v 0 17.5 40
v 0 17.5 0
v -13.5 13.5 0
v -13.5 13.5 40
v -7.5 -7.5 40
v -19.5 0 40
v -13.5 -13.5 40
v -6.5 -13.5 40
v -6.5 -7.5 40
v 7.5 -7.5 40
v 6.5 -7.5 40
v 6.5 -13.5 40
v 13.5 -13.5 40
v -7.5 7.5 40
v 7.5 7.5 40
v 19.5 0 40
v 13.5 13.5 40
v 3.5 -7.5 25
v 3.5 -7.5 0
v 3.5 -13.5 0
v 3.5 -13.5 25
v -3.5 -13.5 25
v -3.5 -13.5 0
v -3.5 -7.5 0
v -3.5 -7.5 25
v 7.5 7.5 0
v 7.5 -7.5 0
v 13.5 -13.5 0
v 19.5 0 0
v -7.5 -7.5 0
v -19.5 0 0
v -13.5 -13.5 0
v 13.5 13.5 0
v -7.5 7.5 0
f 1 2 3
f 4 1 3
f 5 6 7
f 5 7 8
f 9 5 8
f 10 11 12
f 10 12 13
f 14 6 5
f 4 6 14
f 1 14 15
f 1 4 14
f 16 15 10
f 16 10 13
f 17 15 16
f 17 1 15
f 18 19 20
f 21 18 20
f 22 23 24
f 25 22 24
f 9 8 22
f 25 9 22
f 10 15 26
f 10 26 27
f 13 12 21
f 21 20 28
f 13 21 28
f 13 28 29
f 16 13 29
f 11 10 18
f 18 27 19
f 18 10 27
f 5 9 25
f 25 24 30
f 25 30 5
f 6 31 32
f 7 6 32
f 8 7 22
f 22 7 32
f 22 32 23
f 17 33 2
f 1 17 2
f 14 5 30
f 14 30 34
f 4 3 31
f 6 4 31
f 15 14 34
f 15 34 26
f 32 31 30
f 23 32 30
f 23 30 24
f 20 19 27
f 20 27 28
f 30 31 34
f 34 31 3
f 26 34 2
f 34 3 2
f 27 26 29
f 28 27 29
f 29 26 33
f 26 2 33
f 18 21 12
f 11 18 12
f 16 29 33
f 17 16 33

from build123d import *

# Parameters (mm, degrees)
F1_DEPTH = 40
F3_DEPTH = 6


with BuildPart() as f1:
    # F0 (on Top) → F1 (new body)
    with BuildSketch(Plane.XY):
        Polygon((-7.5, -7.5), (-7.5, 7.5), (7.5, 7.5), (7.5, -7.5), (3.5, -7.5), (3.5, -13.5), (13.5, -13.5), (19.5, 0), (13.5, 13.5), (0, 17.5), (-13.5, 13.5), (-19.5, 0), (-13.5, -13.5), (-3.5, -13.5), (-3.5, -7.5), align=None)
    extrude(amount=F1_DEPTH)

    # F2 (on face) → F3 (cut)
    with BuildSketch(Plane.XZ.offset(13.5)):
        Polygon((-3.5, 25), (-3.5, 40), (-6.5, 40), align=None)
        Polygon((3.5, 25), (6.5, 40), (3.5, 40), align=None)
    extrude(amount=-F3_DEPTH, mode=Mode.SUBTRACT)


solid = f1.part
